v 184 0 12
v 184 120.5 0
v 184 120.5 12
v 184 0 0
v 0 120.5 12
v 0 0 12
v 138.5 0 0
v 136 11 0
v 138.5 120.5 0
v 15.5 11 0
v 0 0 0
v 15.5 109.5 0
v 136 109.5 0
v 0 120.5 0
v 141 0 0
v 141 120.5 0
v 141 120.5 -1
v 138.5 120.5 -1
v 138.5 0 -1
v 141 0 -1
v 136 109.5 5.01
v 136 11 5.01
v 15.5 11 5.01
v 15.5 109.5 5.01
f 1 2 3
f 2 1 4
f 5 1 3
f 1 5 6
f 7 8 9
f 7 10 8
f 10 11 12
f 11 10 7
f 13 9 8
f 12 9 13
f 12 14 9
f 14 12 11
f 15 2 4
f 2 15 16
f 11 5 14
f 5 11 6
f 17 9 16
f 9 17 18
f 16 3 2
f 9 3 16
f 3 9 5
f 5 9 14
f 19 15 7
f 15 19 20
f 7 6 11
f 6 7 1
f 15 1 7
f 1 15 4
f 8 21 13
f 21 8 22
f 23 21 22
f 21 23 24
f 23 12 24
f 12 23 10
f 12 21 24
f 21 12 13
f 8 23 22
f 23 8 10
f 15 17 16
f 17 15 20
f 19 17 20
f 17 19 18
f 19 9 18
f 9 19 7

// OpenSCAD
$fa = 1;
$fs = 0.04;

e = 0.01;

/* _________________________
 * |          B=11                       
 * |   _________________
 * |   |                | ^
 * |   |                | ^
 * | A |   121x98       | ^
 * |   |                | ^
 * |   |________________| ^
 * _____________________
 *
 * A = 15.5mm
 * ^ = 141mm
 */

module film_holder(
    holder_height,
    holder_width,
    film_gate_height,
    film_gate_width
) {
    union() {
        difference() {
            // holder body
            cube([holder_width, holder_height, 12]);

            // film gate
            translate([15.5, 11, -e])
                cube([film_gate_width, film_gate_height, 5 + (2* e)]);
        }
        // indexing ridge
        translate([138.5, 0, -1])
            cube([2.5, holder_height, 1]);
    }
}

film_holder(
    holder_height=120.5,
    holder_width=184,
    film_gate_height=98.5,
    film_gate_width=120.5
);
